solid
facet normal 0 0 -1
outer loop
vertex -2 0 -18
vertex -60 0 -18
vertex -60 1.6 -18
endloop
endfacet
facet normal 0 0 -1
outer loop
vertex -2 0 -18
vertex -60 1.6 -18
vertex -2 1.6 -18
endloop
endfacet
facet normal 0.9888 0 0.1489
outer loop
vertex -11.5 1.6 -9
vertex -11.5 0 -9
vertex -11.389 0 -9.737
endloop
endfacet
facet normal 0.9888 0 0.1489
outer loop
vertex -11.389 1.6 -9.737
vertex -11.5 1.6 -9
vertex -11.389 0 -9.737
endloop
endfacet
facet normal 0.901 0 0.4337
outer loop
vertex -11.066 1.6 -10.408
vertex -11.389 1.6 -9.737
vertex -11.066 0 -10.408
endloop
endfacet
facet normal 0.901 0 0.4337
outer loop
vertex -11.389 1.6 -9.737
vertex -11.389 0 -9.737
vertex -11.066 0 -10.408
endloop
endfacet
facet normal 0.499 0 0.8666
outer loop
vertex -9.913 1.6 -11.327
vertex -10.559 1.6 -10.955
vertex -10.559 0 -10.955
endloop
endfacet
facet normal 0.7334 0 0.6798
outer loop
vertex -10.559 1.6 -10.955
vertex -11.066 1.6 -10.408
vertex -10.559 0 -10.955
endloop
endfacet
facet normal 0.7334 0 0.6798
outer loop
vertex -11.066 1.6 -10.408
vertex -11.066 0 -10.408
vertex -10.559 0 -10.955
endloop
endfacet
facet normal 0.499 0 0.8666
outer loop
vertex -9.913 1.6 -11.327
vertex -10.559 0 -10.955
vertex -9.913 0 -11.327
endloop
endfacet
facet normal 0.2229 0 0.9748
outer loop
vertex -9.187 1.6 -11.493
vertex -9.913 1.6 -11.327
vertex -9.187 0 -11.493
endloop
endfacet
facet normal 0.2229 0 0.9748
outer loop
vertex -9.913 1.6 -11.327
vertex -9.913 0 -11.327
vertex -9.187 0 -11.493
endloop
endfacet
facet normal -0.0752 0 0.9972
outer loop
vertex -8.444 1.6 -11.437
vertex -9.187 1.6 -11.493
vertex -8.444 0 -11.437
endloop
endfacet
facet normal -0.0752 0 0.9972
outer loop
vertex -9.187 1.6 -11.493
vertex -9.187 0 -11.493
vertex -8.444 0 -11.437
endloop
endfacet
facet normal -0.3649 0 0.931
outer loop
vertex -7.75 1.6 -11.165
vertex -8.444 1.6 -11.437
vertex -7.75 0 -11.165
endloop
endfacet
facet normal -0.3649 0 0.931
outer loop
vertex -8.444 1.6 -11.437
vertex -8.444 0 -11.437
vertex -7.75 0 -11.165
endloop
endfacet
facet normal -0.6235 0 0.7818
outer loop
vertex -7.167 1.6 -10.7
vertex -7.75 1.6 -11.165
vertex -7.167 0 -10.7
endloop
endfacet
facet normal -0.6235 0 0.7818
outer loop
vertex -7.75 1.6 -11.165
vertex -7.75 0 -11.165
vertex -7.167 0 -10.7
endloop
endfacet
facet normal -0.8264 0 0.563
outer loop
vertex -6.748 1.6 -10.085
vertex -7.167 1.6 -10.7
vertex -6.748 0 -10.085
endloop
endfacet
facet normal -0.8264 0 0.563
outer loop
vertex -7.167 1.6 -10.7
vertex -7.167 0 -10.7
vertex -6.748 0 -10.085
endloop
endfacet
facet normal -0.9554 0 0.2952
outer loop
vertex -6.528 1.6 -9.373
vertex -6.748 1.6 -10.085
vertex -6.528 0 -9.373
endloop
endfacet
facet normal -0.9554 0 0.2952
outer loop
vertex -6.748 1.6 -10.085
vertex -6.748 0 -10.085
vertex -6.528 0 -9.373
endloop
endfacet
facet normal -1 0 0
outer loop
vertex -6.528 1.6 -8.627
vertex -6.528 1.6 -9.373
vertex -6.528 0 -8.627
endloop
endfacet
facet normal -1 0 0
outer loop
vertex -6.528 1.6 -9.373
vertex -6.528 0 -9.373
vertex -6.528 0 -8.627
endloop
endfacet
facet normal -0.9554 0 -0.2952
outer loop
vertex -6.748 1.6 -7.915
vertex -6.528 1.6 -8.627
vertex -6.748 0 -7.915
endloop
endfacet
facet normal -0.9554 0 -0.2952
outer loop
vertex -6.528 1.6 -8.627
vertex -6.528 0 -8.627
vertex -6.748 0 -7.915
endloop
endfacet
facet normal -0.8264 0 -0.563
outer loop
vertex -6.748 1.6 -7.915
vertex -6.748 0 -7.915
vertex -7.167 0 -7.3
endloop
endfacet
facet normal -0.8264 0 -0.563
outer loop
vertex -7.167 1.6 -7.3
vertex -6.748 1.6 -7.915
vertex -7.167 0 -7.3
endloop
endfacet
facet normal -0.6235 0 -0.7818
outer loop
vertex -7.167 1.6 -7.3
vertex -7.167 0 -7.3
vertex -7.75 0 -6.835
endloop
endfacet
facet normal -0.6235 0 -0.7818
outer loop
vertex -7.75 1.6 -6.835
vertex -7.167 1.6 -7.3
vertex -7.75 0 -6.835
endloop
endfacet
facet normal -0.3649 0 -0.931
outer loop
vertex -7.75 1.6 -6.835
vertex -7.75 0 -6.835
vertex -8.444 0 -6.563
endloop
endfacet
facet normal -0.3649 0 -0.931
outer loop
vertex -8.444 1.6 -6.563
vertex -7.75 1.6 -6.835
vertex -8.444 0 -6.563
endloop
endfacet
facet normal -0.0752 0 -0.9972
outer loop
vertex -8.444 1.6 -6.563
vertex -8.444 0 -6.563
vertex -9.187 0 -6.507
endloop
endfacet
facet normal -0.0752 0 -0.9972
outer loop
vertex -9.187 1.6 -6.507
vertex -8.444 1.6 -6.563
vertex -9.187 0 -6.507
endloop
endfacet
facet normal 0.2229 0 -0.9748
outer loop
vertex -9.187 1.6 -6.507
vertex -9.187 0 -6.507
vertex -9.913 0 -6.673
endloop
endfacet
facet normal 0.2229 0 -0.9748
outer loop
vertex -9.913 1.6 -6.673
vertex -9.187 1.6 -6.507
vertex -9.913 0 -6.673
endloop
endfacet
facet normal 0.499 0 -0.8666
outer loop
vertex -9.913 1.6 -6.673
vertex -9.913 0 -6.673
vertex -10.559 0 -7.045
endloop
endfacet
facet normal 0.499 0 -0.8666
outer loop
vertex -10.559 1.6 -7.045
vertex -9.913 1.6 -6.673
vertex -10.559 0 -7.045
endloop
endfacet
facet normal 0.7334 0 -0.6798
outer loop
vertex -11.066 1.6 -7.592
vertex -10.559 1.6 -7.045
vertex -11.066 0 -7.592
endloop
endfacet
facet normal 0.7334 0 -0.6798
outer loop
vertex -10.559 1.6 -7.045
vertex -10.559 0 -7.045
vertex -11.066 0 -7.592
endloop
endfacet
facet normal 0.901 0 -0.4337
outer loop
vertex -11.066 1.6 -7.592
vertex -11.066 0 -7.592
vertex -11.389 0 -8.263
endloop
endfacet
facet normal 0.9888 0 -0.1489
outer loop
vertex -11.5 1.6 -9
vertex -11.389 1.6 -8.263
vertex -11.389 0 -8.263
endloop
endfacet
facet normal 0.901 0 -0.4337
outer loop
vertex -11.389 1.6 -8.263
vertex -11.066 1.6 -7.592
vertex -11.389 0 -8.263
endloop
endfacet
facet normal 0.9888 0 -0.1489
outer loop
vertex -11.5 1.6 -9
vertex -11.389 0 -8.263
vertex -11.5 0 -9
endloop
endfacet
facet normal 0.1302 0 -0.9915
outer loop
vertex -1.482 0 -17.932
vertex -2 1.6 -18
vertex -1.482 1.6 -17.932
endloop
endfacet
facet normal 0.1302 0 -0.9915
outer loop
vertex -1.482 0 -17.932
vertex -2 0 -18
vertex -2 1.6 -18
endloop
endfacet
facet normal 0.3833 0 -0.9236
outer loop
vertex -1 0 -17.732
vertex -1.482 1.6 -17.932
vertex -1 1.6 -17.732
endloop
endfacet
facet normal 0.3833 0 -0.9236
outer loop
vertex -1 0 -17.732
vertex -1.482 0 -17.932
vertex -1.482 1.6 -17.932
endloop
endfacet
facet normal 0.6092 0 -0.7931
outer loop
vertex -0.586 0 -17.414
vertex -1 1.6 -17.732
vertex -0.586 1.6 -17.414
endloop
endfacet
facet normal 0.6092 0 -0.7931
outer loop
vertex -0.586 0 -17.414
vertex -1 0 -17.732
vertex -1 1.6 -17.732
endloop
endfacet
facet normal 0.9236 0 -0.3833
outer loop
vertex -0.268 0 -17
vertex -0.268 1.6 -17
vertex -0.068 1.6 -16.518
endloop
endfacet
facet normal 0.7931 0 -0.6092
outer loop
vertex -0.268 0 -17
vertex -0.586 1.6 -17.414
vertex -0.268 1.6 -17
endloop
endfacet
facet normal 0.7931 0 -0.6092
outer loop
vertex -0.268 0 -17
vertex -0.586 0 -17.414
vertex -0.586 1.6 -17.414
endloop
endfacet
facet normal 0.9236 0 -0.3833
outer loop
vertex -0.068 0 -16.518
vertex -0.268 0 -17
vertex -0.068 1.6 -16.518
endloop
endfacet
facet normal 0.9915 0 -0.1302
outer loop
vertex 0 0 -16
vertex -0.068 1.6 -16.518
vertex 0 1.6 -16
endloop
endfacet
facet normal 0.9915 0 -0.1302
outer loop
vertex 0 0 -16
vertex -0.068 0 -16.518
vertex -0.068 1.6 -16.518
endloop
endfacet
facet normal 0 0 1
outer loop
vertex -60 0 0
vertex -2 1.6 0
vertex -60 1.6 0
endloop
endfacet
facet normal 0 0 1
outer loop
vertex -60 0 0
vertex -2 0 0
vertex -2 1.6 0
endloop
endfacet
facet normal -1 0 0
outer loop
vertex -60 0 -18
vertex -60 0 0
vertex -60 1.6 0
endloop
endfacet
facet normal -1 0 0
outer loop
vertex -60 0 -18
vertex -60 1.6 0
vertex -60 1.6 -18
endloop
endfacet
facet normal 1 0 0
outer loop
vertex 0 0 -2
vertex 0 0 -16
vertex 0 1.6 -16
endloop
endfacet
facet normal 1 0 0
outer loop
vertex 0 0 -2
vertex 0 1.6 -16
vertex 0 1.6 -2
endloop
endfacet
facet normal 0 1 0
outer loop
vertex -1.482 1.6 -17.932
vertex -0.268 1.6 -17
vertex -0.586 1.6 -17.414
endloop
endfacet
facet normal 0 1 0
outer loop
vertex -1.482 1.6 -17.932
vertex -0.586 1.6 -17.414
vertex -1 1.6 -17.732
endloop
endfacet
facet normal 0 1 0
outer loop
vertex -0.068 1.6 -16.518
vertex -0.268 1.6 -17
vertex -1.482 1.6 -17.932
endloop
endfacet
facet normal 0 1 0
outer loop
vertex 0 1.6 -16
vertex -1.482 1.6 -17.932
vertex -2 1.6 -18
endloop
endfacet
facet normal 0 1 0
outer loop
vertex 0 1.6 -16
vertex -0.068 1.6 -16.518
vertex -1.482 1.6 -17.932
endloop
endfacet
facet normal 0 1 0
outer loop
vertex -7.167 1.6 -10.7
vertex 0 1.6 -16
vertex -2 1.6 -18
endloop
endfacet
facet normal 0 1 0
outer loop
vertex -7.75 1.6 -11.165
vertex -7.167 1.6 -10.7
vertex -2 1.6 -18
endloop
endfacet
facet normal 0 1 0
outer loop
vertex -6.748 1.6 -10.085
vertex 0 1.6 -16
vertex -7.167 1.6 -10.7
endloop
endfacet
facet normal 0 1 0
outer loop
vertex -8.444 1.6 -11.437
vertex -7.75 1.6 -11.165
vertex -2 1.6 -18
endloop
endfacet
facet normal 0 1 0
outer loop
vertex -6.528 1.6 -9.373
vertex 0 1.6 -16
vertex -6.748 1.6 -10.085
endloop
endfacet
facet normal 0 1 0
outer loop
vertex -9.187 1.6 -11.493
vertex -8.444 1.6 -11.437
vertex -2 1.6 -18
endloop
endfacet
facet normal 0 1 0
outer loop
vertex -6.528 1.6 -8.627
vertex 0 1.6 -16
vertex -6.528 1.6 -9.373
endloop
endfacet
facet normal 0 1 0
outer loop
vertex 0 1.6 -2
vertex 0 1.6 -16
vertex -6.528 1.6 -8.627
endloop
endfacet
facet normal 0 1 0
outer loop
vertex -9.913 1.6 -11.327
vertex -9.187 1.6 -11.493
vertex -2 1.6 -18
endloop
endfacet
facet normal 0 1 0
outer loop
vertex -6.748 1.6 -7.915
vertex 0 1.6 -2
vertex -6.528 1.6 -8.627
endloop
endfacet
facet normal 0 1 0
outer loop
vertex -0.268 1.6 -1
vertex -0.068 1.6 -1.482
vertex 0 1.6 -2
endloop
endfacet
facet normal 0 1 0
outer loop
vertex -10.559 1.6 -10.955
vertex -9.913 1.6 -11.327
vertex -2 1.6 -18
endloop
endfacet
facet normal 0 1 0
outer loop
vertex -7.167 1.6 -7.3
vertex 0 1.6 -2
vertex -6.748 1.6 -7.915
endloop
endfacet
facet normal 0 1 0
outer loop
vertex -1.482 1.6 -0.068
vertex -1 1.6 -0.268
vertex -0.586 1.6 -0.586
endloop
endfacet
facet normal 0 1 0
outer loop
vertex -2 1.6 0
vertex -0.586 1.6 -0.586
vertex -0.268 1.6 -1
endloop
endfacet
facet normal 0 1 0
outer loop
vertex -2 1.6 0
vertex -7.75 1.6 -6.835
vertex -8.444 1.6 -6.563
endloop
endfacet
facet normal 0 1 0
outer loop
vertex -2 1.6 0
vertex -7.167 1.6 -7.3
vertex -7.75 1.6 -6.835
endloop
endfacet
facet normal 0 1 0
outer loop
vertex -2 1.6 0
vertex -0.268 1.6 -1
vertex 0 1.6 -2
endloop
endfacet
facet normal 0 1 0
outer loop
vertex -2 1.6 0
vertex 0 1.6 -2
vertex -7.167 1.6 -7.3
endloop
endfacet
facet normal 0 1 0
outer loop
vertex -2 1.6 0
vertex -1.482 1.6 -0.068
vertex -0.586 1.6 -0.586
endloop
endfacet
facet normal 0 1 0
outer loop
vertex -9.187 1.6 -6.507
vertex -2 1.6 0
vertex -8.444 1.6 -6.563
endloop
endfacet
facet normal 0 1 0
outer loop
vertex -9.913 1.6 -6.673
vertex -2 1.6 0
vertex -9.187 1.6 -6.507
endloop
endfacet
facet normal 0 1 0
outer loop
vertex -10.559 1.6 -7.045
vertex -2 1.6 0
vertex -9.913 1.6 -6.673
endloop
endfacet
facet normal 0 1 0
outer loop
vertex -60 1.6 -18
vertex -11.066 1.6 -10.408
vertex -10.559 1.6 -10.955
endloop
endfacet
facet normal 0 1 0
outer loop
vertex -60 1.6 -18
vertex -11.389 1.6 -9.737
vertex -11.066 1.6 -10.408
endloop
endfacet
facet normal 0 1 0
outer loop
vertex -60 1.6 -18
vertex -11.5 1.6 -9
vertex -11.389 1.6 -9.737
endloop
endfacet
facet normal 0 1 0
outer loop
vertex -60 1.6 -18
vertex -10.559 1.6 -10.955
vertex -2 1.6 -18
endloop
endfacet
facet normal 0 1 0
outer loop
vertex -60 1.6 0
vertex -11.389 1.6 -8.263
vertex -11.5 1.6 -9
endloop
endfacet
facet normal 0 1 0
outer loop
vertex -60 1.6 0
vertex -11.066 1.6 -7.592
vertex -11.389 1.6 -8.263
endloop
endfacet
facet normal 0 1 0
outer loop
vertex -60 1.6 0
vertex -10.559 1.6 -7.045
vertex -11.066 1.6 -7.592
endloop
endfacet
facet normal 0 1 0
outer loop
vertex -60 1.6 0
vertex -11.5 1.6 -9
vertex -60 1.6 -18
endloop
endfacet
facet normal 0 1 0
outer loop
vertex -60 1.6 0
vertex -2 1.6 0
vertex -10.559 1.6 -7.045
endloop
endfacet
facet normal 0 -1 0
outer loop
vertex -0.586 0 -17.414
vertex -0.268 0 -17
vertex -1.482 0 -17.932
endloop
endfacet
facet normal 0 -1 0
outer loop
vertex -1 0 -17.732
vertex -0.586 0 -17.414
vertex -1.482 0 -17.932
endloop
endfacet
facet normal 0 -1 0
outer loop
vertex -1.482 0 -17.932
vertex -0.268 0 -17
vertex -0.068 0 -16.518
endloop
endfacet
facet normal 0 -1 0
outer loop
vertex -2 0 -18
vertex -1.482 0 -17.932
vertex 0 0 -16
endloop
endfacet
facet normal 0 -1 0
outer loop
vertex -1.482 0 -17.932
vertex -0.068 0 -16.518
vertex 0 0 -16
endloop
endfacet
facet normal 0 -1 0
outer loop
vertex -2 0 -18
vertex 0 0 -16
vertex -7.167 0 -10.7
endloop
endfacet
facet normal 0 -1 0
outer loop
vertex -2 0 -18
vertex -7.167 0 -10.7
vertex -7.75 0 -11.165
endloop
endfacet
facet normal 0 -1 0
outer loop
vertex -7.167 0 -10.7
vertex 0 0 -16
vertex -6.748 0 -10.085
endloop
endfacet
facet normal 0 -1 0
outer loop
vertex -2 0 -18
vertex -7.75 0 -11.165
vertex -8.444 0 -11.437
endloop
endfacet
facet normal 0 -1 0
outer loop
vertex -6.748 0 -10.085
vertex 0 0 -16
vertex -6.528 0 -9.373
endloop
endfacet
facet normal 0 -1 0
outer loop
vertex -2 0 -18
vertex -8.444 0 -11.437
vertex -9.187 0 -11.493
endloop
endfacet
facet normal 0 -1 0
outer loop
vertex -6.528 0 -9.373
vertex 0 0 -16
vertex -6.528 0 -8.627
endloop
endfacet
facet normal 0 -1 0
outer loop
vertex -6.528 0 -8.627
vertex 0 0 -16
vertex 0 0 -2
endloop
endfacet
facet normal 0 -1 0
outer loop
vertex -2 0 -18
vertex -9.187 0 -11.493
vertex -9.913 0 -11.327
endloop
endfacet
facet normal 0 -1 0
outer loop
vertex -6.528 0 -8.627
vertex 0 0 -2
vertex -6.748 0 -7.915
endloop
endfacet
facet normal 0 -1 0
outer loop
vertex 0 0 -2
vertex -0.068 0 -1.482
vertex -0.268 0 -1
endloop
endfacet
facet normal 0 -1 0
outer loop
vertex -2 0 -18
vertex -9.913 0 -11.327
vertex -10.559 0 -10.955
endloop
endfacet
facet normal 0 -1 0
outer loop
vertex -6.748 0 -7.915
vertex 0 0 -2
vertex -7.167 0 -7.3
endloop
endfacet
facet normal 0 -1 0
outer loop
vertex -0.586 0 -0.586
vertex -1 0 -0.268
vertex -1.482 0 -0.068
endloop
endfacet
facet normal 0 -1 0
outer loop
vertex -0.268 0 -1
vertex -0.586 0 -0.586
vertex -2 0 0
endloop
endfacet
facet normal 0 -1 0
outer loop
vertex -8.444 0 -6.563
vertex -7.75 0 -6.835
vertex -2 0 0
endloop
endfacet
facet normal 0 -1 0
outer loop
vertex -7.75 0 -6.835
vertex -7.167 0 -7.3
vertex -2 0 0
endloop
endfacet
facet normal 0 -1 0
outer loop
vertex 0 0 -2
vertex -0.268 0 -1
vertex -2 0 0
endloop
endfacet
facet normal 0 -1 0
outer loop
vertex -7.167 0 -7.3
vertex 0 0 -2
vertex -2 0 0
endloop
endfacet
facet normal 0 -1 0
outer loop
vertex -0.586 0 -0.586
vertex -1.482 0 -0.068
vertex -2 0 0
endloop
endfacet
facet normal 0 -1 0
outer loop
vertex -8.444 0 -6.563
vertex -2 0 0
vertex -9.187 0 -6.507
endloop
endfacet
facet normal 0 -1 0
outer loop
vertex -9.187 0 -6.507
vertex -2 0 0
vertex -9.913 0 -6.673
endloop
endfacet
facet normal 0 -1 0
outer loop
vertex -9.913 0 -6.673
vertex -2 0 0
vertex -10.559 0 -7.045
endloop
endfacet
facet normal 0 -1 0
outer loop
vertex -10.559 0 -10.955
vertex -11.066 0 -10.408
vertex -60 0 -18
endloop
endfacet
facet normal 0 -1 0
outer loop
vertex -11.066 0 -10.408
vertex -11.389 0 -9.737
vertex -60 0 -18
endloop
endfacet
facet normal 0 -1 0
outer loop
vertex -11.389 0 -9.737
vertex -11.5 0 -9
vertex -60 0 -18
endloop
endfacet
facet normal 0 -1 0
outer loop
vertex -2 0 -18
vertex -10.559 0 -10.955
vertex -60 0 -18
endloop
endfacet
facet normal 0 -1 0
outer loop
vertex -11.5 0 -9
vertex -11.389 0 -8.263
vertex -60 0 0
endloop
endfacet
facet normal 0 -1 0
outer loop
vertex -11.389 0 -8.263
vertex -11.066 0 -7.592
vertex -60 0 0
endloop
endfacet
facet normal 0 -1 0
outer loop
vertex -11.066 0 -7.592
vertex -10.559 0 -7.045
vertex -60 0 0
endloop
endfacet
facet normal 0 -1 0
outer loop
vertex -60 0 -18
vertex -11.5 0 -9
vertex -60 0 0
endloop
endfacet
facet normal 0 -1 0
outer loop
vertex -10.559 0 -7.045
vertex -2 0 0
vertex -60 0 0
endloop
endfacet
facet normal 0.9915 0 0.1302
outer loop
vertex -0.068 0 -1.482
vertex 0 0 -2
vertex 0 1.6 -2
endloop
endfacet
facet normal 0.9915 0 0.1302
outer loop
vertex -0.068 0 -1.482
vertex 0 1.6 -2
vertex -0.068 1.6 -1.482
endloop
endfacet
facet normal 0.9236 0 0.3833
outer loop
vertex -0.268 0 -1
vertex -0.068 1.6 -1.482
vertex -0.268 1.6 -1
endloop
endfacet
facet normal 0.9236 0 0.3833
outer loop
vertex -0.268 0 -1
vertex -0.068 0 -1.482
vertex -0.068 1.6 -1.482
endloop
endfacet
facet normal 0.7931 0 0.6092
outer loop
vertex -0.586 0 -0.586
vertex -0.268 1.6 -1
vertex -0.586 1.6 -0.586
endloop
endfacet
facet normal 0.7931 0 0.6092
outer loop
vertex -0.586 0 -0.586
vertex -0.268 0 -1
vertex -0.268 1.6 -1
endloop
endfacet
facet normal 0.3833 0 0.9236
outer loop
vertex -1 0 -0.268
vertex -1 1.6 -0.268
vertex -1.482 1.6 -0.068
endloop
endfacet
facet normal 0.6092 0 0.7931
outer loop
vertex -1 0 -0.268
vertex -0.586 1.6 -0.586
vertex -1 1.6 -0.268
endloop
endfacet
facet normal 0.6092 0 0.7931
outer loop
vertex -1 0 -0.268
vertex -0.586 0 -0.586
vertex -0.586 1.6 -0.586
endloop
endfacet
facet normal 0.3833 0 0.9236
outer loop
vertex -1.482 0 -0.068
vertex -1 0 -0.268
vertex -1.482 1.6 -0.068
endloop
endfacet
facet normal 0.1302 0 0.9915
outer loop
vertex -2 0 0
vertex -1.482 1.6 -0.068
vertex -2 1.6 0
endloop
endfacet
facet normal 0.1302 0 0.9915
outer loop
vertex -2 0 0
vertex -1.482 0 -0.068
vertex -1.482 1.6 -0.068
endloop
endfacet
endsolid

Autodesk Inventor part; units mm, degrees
ref_plane "YZ Plane" through (0, 0, 0) normal (1, 0, 0) x (0, 1, 0)
ref_plane "XZ Plane" through (0, 0, 0) normal (0, 1, 0) x (-1, 0, 0)
ref_plane "XY Plane" through (0, 0, 0) normal (0, 0, 1) x (1, 0, 0)
sketch "Szkic1" plane through (0, 0, 0) normal (0, 1, 0) x (-1, 0, 0)
  line L0 (2, 0) -> (60, 0)
  line L1 (60, 0) -> (60, -18)
  line L2 (60, -18) -> (2, -18)
  line L3 (0, -16) -> (0, -2)
  circle A0 centre (9, -9) radius 2.5
  arc A1 (0, -16) -> (2, -18) centre (2, -16) ccw
  arc A2 (2, 0) -> (0, -2) centre (2, -2) ccw
  point P0 (0, 0)
  point P1 (0, -18)
  dimension "d0" = 60
  dimension "d1" = 18
  dimension "d2" = 5
  dimension "d3" = 9
  dimension "d4" = 9
  dimension "d5" = 2
extrude "Wyciągnięcie proste1" add sketch "Szkic1" along normal blind 1.6
equation "\"d4\" = 0.5 * d1"
properties part number "ramie3"
